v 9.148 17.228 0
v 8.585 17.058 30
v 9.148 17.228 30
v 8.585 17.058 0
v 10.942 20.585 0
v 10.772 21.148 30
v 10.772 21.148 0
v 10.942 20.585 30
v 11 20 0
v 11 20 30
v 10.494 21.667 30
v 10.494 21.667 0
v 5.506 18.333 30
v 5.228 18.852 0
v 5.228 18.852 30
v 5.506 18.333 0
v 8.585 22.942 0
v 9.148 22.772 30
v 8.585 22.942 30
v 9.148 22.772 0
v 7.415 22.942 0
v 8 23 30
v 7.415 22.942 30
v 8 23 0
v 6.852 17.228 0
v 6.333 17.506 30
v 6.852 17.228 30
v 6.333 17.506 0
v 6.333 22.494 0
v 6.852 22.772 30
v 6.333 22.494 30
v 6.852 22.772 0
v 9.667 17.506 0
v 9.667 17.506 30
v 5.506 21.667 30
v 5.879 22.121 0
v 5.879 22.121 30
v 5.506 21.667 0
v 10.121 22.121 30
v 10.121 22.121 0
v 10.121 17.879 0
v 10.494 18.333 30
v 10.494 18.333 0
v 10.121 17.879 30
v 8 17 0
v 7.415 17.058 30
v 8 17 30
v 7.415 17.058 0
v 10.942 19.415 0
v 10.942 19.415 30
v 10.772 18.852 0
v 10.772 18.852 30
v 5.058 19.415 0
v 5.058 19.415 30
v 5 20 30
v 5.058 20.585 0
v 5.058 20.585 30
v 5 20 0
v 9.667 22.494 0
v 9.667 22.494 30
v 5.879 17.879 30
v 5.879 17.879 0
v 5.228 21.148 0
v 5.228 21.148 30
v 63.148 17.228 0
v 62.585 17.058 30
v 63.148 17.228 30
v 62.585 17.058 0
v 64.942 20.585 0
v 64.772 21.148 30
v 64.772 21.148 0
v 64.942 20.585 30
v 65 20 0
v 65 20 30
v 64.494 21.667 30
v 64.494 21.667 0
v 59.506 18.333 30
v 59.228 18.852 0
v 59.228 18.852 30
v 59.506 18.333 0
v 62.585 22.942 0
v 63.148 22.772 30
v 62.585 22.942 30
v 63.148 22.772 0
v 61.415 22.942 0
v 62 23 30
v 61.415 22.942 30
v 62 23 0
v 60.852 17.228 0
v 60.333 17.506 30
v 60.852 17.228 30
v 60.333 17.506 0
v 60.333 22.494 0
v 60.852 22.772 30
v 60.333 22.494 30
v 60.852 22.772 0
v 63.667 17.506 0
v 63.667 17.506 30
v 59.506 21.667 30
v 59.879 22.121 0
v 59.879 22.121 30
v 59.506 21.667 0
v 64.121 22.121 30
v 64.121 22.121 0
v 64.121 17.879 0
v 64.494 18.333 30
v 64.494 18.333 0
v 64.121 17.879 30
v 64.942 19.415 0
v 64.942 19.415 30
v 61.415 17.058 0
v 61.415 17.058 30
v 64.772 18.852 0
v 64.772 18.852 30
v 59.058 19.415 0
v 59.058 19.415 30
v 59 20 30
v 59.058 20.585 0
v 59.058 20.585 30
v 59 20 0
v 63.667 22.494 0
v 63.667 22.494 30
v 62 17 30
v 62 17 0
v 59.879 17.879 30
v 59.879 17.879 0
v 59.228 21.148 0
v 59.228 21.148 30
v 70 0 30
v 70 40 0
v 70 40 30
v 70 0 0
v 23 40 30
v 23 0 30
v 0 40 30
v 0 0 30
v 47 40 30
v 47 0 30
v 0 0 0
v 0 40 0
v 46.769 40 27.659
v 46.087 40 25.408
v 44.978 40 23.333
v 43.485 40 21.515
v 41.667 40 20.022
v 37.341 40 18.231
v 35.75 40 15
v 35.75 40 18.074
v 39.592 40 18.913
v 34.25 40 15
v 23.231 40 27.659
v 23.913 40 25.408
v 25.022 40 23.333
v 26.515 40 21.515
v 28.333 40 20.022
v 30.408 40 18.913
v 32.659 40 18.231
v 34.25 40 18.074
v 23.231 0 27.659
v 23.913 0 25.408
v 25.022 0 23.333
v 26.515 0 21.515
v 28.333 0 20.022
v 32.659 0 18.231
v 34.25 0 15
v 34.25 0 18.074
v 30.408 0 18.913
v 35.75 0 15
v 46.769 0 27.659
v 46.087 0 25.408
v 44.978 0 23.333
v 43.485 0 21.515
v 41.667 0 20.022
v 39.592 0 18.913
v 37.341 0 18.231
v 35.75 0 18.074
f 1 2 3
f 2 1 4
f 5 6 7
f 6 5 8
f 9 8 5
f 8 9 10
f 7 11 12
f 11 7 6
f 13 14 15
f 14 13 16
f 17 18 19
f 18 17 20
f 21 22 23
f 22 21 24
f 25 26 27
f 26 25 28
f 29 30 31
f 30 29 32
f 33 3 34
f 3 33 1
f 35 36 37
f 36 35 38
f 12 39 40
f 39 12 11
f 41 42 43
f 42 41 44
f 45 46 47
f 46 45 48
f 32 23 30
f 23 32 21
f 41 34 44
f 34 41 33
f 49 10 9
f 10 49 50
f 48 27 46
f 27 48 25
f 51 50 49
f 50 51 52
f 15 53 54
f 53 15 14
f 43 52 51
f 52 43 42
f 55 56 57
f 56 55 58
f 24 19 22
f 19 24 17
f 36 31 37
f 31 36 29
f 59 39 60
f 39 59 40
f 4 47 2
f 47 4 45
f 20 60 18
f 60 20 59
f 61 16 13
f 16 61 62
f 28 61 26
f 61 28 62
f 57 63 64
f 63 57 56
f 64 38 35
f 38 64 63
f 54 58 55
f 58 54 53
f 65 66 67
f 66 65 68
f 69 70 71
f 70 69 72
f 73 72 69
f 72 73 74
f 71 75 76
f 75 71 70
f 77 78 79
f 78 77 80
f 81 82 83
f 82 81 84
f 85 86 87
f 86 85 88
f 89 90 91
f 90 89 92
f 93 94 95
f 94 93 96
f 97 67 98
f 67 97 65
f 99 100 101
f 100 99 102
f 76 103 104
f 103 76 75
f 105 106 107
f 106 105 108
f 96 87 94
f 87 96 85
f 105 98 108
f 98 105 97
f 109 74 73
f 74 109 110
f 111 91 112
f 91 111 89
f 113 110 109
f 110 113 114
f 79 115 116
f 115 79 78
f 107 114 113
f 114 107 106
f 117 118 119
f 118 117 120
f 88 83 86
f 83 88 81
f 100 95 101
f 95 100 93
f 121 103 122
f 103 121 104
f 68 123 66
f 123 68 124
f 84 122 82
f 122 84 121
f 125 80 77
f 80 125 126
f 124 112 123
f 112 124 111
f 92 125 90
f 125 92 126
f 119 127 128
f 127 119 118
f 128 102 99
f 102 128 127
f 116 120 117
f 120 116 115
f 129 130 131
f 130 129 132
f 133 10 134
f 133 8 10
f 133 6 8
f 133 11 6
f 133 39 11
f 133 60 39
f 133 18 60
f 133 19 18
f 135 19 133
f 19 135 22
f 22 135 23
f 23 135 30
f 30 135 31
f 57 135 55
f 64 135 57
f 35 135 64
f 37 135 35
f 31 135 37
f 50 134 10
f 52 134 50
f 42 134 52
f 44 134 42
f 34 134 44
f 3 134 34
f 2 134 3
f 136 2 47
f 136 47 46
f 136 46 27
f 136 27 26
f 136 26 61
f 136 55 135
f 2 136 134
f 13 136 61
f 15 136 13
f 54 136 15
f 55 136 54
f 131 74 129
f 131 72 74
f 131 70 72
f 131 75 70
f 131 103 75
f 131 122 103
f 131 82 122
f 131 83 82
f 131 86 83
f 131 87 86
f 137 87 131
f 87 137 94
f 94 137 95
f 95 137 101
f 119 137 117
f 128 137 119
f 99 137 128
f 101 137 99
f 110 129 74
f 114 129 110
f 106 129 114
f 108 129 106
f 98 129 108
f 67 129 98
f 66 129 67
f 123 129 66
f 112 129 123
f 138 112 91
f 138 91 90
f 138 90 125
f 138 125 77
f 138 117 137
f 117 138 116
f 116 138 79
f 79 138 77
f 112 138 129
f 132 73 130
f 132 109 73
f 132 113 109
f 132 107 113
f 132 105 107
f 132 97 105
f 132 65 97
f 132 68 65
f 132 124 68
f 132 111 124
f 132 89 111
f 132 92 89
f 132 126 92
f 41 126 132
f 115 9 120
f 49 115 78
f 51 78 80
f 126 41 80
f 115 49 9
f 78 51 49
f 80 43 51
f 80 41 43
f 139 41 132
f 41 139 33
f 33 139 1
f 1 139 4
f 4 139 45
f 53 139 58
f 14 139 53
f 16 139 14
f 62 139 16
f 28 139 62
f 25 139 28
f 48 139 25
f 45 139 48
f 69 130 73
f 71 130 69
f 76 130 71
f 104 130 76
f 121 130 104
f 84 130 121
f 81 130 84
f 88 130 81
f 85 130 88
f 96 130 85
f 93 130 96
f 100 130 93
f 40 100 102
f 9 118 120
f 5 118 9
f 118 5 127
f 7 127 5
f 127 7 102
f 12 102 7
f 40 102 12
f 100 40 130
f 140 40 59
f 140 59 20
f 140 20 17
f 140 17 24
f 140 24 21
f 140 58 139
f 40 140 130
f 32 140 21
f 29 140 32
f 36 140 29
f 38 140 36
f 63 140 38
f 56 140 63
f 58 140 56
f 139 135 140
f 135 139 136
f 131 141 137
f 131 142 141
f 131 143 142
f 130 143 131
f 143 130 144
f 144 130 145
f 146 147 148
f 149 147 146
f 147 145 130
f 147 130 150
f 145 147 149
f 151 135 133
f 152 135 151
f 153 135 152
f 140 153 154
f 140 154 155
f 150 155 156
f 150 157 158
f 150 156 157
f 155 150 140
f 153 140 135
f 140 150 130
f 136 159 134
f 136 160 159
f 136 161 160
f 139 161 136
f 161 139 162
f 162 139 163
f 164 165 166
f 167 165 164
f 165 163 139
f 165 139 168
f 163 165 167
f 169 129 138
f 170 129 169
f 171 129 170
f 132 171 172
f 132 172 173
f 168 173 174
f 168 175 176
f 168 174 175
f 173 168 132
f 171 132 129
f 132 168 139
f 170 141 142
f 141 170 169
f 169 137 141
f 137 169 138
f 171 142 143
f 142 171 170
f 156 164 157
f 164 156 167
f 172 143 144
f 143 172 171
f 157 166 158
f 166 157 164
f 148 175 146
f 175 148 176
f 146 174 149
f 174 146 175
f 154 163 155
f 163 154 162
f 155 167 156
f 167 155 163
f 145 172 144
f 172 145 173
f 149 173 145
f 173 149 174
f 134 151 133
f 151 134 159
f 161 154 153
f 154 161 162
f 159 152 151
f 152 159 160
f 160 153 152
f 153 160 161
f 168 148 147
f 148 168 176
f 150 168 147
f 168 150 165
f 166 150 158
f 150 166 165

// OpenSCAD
$fn = 32;

// ----------------------------------------------------------------------
// Saddle clamp: split shaft clamp
// ----------------------------------------------------------------------

// --- parameters (mm) ---
blk_l = 70;               // block length, X
blk_w = 40;               // block width, Y
blk_h = 30;               // block height
clamp_r = 12;             // shaft groove radius
hole_r = 3;               // bolt hole radius
hole_m = 8;               // bolt hole margin from the ends
saw_w = 1.5;              // saw kerf width

saw_depth = clamp_r + 3;  // saw kerf depth

difference() {
  cube([blk_l, blk_w, blk_h]);
  translate([blk_l / 2, -1, blk_h])
    rotate([-90, 0, 0])
      cylinder(h = blk_w + 2, r = clamp_r);
  for (sx = [0, 1])
    translate([sx ? blk_l - hole_m : hole_m, blk_w / 2, -1])
      cylinder(r = hole_r, h = blk_h + 2);
  translate([blk_l / 2 - saw_w / 2, -1, blk_h - saw_depth])
    cube([saw_w, blk_w + 2, saw_depth + 1]);
}
